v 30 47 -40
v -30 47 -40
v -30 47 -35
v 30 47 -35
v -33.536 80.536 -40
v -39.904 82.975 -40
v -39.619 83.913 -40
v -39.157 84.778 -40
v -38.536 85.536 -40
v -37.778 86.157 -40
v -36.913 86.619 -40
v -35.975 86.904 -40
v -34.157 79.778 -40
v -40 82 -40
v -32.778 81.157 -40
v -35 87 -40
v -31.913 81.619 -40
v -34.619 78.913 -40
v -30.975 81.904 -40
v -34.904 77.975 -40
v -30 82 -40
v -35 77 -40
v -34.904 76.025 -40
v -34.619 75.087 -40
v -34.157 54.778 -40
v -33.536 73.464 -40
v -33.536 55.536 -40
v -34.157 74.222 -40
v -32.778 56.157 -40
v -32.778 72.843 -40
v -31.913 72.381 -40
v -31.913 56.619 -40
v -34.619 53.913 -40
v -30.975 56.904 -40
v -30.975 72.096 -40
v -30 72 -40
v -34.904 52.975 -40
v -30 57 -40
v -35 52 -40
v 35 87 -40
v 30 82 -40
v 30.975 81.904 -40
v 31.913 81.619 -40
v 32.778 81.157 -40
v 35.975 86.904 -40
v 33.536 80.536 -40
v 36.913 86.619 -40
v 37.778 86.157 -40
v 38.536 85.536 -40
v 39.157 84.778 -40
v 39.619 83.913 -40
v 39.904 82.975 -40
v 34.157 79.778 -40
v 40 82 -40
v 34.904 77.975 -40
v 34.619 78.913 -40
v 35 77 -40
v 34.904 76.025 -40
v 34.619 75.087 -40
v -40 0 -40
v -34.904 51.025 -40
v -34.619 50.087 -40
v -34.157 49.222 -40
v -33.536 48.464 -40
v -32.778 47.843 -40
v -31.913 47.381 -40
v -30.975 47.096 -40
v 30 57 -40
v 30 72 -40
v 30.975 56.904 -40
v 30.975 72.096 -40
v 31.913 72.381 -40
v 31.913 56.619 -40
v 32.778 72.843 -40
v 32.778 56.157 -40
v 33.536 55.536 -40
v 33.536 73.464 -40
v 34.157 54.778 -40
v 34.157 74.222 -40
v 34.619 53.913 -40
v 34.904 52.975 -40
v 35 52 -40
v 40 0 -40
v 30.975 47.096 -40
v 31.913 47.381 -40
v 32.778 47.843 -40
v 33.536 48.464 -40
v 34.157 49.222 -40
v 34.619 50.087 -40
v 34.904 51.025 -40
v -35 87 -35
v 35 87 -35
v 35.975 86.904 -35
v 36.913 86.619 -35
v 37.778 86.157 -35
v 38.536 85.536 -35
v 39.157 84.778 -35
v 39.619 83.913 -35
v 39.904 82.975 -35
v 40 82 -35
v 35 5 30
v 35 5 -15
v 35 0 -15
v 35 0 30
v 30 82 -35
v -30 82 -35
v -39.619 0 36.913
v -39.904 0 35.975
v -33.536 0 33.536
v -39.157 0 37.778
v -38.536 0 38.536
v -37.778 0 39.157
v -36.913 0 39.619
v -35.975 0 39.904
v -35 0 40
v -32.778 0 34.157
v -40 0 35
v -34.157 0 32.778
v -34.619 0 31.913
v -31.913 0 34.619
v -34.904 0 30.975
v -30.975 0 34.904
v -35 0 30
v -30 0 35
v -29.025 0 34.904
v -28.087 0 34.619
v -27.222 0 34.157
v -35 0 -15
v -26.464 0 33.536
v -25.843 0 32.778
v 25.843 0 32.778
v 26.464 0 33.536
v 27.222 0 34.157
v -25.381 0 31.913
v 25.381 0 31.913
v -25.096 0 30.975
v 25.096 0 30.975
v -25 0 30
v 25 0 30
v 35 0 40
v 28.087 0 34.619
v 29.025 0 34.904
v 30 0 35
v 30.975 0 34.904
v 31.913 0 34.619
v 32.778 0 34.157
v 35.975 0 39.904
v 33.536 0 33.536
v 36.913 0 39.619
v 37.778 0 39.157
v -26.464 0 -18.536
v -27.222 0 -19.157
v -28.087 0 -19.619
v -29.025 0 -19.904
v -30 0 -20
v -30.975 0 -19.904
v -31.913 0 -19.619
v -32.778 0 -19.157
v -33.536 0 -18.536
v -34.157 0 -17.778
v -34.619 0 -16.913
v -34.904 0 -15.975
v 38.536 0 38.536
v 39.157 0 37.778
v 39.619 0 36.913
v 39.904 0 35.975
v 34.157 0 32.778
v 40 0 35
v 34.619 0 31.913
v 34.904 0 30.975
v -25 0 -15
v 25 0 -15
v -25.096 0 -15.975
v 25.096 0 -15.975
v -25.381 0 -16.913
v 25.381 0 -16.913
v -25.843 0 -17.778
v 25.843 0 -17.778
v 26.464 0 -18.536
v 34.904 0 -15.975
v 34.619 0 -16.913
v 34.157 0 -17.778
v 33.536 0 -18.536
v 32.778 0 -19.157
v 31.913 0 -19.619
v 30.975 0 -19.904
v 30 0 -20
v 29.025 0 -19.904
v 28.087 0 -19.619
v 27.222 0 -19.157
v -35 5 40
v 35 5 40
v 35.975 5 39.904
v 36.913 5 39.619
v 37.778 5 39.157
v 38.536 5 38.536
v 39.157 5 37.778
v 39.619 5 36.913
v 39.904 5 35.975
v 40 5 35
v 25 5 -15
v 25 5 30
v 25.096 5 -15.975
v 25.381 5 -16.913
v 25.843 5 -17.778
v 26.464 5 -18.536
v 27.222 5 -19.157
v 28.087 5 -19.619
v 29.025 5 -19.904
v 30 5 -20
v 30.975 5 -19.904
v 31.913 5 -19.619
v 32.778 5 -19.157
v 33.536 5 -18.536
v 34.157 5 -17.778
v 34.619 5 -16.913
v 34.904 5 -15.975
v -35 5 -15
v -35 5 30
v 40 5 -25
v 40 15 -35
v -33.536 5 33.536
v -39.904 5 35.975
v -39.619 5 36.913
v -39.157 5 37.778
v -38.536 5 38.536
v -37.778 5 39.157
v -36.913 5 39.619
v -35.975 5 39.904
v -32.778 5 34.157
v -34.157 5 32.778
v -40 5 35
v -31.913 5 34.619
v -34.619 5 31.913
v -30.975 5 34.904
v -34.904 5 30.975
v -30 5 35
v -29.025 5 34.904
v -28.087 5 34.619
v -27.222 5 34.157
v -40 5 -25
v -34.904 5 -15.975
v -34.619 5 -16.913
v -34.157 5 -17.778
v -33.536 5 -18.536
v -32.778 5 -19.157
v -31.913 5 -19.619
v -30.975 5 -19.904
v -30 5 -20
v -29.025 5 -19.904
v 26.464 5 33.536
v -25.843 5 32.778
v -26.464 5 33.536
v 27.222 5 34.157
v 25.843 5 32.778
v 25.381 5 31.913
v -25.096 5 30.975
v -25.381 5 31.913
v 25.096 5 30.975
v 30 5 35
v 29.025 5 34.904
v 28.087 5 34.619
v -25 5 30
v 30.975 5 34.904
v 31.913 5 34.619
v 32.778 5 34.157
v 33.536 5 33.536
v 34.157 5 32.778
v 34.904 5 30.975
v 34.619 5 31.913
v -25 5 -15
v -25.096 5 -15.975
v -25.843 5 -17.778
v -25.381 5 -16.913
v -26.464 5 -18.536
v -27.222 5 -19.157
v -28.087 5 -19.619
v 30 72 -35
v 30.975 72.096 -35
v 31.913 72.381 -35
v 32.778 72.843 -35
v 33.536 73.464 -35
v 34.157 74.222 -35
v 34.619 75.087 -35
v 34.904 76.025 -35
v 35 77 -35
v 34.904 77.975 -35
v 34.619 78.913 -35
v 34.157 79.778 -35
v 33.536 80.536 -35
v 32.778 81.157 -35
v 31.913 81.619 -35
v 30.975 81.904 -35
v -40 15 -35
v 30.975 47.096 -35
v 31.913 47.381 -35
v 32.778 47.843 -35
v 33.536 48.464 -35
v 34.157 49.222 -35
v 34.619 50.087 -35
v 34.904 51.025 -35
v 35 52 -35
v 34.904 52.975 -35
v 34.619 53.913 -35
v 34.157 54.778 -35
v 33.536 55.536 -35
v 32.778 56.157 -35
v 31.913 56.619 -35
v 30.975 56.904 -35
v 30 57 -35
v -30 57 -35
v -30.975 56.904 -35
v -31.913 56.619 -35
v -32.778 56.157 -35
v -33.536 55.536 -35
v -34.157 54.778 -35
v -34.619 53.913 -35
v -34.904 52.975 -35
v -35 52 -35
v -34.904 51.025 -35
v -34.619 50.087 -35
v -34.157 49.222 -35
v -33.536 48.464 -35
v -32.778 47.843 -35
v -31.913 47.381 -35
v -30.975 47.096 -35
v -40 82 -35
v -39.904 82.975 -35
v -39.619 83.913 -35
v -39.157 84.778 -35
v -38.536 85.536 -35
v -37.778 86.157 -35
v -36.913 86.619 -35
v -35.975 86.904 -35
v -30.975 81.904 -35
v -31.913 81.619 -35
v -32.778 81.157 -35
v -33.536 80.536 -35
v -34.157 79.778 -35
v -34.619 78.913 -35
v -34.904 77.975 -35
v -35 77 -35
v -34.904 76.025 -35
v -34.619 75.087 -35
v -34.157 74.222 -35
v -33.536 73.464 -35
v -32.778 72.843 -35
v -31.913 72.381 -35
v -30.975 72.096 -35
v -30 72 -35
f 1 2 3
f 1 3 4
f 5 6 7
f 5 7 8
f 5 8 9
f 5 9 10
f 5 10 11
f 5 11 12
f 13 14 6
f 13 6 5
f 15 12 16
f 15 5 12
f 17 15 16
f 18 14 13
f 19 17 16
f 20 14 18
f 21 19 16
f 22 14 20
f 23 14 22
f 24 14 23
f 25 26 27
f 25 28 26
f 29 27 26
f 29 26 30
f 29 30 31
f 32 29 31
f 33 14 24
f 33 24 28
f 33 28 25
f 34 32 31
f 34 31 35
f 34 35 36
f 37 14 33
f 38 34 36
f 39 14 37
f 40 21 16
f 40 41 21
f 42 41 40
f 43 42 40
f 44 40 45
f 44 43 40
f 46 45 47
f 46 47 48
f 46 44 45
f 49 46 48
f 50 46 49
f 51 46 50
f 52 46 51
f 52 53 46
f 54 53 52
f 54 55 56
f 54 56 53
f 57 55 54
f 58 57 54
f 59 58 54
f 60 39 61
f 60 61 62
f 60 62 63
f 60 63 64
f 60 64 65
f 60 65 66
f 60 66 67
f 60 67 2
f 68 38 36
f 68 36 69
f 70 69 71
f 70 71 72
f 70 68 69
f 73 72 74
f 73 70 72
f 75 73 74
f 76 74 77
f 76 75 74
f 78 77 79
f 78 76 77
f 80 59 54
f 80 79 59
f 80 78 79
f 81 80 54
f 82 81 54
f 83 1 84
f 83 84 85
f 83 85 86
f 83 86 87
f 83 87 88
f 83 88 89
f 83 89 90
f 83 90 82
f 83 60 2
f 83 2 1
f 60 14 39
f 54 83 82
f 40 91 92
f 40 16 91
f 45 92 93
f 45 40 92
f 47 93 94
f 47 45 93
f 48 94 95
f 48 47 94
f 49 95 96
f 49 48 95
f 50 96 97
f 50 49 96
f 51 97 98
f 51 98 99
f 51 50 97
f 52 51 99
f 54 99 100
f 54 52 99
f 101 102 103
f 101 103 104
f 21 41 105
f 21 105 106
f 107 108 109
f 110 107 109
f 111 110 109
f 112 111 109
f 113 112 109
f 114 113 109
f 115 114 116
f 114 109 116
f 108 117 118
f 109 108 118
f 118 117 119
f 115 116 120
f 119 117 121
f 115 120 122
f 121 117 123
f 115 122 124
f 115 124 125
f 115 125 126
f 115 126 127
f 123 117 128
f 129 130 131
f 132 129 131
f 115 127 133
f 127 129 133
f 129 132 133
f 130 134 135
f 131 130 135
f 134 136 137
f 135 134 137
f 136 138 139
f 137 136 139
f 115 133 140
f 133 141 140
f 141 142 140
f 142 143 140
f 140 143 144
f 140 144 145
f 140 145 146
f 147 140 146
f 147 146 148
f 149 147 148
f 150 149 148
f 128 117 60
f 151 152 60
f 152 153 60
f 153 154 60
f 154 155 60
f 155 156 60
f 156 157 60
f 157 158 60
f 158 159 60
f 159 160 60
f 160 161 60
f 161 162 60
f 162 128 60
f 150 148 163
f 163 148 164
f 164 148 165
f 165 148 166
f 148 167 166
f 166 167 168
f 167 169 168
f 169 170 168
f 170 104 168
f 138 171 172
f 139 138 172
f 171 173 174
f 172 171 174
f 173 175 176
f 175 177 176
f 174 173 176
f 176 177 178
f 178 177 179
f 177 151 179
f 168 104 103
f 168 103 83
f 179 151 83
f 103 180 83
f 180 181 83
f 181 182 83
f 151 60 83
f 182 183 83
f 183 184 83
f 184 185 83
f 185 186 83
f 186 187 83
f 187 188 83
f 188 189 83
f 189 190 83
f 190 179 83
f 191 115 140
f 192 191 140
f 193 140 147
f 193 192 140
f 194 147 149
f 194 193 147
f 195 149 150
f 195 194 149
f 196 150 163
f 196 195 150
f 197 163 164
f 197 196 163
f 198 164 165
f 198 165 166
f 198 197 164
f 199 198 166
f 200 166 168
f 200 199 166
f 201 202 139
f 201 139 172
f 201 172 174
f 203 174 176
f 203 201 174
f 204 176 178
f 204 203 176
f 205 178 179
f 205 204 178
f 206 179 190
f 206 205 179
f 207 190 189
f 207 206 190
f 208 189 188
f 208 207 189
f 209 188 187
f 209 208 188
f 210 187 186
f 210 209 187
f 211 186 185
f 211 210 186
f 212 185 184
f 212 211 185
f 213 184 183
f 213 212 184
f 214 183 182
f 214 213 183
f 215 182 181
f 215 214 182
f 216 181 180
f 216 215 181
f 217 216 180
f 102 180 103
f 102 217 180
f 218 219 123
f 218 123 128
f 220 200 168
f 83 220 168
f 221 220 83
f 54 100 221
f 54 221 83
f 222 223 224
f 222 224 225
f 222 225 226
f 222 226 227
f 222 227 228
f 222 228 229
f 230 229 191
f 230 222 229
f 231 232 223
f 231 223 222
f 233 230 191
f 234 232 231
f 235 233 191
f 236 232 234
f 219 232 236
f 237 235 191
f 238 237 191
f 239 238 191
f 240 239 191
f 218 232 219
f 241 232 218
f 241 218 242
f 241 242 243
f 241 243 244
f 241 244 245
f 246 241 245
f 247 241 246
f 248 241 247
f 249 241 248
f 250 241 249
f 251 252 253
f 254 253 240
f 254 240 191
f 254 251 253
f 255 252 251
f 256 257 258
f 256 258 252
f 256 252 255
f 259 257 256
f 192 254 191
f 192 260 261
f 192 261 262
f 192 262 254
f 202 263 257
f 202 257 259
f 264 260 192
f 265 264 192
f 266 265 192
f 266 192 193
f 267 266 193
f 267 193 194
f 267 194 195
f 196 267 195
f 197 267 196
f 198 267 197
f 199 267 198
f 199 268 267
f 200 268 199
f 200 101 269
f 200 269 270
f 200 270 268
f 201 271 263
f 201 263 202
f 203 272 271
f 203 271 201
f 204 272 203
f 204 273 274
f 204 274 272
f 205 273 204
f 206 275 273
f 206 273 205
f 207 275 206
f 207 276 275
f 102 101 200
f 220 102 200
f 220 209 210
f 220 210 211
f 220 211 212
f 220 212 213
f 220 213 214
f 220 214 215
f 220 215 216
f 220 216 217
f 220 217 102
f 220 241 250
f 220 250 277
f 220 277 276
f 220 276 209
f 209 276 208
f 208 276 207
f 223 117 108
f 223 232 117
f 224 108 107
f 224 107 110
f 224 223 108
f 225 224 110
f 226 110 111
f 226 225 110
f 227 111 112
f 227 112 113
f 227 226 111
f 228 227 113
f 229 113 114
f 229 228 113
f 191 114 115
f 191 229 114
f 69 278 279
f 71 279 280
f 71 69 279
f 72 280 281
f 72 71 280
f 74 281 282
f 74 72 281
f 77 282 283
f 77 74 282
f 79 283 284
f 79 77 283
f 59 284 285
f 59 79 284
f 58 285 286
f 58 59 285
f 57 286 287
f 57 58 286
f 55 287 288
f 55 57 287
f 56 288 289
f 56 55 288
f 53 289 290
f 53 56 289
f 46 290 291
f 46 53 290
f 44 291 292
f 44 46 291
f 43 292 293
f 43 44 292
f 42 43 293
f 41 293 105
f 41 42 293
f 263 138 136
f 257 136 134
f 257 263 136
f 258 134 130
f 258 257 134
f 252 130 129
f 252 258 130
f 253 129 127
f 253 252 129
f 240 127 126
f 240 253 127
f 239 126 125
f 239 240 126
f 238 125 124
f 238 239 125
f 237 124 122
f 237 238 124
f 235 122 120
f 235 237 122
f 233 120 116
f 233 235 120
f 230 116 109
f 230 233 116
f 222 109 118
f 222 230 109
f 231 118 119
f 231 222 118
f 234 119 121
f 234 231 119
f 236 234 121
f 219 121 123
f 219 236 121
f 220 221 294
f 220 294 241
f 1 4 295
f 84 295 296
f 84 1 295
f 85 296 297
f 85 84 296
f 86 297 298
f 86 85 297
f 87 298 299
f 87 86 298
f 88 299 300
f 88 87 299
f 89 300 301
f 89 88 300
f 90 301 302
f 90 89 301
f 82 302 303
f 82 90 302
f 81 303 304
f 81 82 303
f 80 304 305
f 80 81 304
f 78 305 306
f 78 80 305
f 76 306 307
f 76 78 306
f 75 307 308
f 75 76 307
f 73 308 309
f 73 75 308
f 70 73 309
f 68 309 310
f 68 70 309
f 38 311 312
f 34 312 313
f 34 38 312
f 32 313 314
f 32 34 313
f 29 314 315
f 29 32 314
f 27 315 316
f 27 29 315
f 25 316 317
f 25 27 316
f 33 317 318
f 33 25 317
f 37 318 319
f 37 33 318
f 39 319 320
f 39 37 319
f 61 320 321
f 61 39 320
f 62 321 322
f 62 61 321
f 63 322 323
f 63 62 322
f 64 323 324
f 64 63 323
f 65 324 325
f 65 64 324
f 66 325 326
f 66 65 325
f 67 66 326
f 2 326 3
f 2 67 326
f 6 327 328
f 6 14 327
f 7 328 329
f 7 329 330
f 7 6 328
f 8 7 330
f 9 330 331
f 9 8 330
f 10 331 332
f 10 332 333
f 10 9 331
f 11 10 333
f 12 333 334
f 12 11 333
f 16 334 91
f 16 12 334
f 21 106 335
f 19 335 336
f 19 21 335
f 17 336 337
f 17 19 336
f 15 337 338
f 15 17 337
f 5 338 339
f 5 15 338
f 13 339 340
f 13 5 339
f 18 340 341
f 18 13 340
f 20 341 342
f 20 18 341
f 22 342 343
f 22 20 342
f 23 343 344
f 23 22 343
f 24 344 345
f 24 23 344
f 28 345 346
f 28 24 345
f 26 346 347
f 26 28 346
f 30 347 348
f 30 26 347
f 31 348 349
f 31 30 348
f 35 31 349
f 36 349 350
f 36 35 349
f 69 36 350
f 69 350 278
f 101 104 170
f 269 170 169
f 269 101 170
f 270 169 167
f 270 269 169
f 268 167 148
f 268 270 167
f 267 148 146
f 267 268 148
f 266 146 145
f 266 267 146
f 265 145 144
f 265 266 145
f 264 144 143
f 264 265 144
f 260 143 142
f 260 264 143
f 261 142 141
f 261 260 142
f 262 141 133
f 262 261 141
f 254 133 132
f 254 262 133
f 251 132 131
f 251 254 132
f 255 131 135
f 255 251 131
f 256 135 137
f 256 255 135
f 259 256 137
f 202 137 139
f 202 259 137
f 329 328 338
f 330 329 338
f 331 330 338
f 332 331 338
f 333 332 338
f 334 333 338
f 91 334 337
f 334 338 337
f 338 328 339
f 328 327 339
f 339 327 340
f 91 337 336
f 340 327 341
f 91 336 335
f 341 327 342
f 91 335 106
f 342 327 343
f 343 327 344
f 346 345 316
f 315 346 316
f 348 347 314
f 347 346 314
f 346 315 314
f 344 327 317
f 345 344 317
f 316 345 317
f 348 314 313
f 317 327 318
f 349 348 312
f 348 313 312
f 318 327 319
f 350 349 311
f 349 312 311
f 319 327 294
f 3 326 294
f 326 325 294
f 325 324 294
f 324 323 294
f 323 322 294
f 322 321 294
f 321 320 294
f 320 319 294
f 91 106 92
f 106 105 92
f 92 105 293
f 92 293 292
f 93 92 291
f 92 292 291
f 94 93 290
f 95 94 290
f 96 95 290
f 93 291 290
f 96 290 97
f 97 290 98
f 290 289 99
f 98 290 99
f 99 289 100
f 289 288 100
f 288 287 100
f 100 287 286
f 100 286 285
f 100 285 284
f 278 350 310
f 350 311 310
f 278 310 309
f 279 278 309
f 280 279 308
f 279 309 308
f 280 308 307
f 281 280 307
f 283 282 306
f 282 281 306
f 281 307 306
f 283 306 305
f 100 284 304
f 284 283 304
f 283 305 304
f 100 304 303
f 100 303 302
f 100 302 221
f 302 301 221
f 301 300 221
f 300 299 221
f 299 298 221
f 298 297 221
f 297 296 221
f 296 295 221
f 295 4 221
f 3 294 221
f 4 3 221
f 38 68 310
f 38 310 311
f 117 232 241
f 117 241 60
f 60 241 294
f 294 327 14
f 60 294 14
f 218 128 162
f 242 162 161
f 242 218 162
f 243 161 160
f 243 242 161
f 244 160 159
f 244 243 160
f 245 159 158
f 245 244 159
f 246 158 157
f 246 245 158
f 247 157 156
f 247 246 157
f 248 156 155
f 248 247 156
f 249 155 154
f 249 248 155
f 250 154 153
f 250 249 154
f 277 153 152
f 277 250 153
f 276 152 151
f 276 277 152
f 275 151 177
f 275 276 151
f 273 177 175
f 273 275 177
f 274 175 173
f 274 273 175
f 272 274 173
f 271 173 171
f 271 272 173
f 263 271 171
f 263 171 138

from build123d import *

# Parameters (mm, degrees)
SKETCH1_W           = 80
SKETCH1_H           = 80
BOSS_EXTRUDE1_DEPTH = 5
SKETCH2_W           = 80
SKETCH2_H           = 5
BOSS_EXTRUDE2_DEPTH = 82
CUT_EXTRUDE1_DEPTH  = 81
CUT_EXTRUDE2_DEPTH  = 6
FILLET1_R           = 5
FILLET2_R           = 5
BOSS_EXTRUDE3_DEPTH = 80


with BuildPart() as part:
    # Sketch1 → Boss-Extrude1 (new body)
    with BuildSketch(Plane(origin=(0, 0, 0), x_dir=(1, 0, 0), z_dir=(0, 1, 0))):
        Rectangle(SKETCH1_W, SKETCH1_H)
    extrude(amount=BOSS_EXTRUDE1_DEPTH)

    # Sketch2 → Boss-Extrude2 (add)
    with BuildSketch(Plane(origin=(0, 5, 0), x_dir=(1, 0, 0), z_dir=(0, 1, 0))):
        with Locations((0, 37.5)):
            Rectangle(SKETCH2_W, SKETCH2_H)
    extrude(amount=BOSS_EXTRUDE2_DEPTH)

    # Sketch6 → Cut-Extrude1 (cut, through all)
    with BuildSketch(Plane(origin=(0, 0, -40), x_dir=(-1, 0, 0), z_dir=(0, 0, -1))):
        with BuildLine():
            Line((-30, 82), (30, 82))
            ThreePointArc((30, 82), (35, 77), (30, 72))
            Line((30, 72), (-30, 72))
            ThreePointArc((-30, 72), (-35, 77), (-30, 82))
        make_face()
        with BuildLine():
            Line((-30, 57), (30, 57))
            ThreePointArc((30, 57), (35, 52), (30, 47))
            Line((30, 47), (-30, 47))
            ThreePointArc((-30, 47), (-35, 52), (-30, 57))
        make_face()
    extrude(amount=-CUT_EXTRUDE1_DEPTH, mode=Mode.SUBTRACT)

    # Sketch7 → Cut-Extrude2 (cut, through all)
    with BuildSketch(Plane(origin=(0, 5, 0), x_dir=(1, 0, 0), z_dir=(0, 1, 0))):
        with BuildLine():
            Line((-35, -30), (-35, 15))
            ThreePointArc((-35, 15), (-30, 20), (-25, 15))
            Line((-25, 15), (-25, -30))
            ThreePointArc((-25, -30), (-30, -35), (-35, -30))
        make_face()
        with BuildLine():
            Line((35, 15), (35, -30))
            ThreePointArc((35, -30), (30, -35), (25, -30))
            Line((25, -30), (25, 15))
            ThreePointArc((25, 15), (30, 20), (35, 15))
        make_face()
    extrude(amount=-CUT_EXTRUDE2_DEPTH, mode=Mode.SUBTRACT)

    # Fillet1
    fillet1_edges = [part.edges().sort_by_distance(p)[0] for p in [
        (40, 2.5, 40),
        (-40, 2.5, 40),
    ]]
    fillet(fillet1_edges, radius=FILLET1_R)

    # Fillet2
    fillet2_edges = [part.edges().sort_by_distance(p)[0] for p in [
        (-40, 87, -37.5),
        (40, 87, -37.5),
    ]]
    fillet(fillet2_edges, radius=FILLET2_R)

    # Sketch8 → Boss-Extrude3 (add)
    with BuildSketch(Plane(origin=(40, 0, 0), x_dir=(0, 0, -1), z_dir=(1, 0, 0))):
        Polygon((35, 15), (25, 5), (35, 5), align=None)
    extrude(amount=-BOSS_EXTRUDE3_DEPTH)


solid = part.part
